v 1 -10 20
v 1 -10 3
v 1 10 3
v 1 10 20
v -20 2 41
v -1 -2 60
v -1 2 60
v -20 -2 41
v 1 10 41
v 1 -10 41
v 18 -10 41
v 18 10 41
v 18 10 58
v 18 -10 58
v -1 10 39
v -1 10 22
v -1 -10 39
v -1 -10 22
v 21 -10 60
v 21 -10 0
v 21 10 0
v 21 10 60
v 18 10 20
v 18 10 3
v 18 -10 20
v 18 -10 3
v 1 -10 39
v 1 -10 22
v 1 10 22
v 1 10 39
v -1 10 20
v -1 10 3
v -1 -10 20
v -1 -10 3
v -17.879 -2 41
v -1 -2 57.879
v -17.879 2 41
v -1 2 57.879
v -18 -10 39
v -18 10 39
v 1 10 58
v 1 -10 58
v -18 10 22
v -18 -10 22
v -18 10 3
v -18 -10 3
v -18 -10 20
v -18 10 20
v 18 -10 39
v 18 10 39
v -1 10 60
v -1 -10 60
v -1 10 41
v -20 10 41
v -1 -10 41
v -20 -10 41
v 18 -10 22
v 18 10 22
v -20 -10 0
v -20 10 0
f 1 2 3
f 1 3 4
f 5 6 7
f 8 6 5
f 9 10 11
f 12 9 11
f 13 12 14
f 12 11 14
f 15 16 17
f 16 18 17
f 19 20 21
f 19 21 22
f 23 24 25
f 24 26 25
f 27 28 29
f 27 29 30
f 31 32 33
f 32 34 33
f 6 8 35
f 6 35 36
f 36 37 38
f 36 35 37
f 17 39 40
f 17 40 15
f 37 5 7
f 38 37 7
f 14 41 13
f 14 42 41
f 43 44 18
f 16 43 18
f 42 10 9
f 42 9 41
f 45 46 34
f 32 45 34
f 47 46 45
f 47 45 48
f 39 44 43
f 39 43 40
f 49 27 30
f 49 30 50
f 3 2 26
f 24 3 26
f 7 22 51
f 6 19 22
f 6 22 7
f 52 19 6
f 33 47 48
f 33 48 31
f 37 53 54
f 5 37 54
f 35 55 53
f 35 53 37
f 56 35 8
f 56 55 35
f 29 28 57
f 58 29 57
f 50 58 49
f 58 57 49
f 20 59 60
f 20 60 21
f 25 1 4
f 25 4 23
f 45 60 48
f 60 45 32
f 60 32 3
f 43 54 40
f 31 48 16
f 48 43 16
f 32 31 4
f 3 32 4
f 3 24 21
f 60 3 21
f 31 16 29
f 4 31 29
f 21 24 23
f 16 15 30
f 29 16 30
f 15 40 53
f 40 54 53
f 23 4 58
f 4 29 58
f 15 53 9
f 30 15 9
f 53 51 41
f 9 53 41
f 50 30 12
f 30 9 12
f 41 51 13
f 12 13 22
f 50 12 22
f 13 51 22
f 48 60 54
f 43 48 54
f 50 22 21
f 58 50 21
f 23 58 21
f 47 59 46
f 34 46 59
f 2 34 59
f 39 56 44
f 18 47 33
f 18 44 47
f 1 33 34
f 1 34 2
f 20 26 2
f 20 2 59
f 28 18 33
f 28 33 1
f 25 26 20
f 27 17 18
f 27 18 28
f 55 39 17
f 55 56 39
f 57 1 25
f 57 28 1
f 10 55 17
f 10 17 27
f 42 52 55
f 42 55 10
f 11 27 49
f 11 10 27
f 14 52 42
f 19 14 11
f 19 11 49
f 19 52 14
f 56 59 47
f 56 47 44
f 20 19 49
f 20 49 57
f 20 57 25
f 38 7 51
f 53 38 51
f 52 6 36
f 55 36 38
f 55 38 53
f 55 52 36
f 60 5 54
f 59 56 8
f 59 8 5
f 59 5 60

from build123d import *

# Parameters (mm, degrees)
F0_W     = 17
F0_H     = 17
F1_DEPTH = 10
F3_DEPTH = 2


with BuildPart() as f1:
    # F0 (on Front) → F1 (new body, symmetric)
    with BuildSketch(Plane.XZ):
        Polygon((-20, 41), (-20, 0), (21, 0), (21, 60), (-1, 60), (-1, 41), align=None)
        with Locations((-9.5, 11.5)):
            Rectangle(F0_W, F0_H, mode=Mode.SUBTRACT)
        with Locations((9.5, 11.5)):
            Rectangle(F0_W, F0_H, mode=Mode.SUBTRACT)
        with Locations((-9.5, 30.5)):
            Rectangle(F0_W, F0_H, mode=Mode.SUBTRACT)
        with Locations((9.5, 30.5)):
            Rectangle(F0_W, F0_H, mode=Mode.SUBTRACT)
        with Locations((9.5, 49.5)):
            Rectangle(F0_W, F0_H, mode=Mode.SUBTRACT)
    extrude(amount=F1_DEPTH, both=True)

    # F2 (on Front) → F3 (join, symmetric)
    with BuildSketch(Plane.XZ):
        Polygon((-1, 57.87868), (-1, 60), (-20, 41), (-17.87868, 41), align=None)
    extrude(amount=F3_DEPTH, both=True)


solid = f1.part
